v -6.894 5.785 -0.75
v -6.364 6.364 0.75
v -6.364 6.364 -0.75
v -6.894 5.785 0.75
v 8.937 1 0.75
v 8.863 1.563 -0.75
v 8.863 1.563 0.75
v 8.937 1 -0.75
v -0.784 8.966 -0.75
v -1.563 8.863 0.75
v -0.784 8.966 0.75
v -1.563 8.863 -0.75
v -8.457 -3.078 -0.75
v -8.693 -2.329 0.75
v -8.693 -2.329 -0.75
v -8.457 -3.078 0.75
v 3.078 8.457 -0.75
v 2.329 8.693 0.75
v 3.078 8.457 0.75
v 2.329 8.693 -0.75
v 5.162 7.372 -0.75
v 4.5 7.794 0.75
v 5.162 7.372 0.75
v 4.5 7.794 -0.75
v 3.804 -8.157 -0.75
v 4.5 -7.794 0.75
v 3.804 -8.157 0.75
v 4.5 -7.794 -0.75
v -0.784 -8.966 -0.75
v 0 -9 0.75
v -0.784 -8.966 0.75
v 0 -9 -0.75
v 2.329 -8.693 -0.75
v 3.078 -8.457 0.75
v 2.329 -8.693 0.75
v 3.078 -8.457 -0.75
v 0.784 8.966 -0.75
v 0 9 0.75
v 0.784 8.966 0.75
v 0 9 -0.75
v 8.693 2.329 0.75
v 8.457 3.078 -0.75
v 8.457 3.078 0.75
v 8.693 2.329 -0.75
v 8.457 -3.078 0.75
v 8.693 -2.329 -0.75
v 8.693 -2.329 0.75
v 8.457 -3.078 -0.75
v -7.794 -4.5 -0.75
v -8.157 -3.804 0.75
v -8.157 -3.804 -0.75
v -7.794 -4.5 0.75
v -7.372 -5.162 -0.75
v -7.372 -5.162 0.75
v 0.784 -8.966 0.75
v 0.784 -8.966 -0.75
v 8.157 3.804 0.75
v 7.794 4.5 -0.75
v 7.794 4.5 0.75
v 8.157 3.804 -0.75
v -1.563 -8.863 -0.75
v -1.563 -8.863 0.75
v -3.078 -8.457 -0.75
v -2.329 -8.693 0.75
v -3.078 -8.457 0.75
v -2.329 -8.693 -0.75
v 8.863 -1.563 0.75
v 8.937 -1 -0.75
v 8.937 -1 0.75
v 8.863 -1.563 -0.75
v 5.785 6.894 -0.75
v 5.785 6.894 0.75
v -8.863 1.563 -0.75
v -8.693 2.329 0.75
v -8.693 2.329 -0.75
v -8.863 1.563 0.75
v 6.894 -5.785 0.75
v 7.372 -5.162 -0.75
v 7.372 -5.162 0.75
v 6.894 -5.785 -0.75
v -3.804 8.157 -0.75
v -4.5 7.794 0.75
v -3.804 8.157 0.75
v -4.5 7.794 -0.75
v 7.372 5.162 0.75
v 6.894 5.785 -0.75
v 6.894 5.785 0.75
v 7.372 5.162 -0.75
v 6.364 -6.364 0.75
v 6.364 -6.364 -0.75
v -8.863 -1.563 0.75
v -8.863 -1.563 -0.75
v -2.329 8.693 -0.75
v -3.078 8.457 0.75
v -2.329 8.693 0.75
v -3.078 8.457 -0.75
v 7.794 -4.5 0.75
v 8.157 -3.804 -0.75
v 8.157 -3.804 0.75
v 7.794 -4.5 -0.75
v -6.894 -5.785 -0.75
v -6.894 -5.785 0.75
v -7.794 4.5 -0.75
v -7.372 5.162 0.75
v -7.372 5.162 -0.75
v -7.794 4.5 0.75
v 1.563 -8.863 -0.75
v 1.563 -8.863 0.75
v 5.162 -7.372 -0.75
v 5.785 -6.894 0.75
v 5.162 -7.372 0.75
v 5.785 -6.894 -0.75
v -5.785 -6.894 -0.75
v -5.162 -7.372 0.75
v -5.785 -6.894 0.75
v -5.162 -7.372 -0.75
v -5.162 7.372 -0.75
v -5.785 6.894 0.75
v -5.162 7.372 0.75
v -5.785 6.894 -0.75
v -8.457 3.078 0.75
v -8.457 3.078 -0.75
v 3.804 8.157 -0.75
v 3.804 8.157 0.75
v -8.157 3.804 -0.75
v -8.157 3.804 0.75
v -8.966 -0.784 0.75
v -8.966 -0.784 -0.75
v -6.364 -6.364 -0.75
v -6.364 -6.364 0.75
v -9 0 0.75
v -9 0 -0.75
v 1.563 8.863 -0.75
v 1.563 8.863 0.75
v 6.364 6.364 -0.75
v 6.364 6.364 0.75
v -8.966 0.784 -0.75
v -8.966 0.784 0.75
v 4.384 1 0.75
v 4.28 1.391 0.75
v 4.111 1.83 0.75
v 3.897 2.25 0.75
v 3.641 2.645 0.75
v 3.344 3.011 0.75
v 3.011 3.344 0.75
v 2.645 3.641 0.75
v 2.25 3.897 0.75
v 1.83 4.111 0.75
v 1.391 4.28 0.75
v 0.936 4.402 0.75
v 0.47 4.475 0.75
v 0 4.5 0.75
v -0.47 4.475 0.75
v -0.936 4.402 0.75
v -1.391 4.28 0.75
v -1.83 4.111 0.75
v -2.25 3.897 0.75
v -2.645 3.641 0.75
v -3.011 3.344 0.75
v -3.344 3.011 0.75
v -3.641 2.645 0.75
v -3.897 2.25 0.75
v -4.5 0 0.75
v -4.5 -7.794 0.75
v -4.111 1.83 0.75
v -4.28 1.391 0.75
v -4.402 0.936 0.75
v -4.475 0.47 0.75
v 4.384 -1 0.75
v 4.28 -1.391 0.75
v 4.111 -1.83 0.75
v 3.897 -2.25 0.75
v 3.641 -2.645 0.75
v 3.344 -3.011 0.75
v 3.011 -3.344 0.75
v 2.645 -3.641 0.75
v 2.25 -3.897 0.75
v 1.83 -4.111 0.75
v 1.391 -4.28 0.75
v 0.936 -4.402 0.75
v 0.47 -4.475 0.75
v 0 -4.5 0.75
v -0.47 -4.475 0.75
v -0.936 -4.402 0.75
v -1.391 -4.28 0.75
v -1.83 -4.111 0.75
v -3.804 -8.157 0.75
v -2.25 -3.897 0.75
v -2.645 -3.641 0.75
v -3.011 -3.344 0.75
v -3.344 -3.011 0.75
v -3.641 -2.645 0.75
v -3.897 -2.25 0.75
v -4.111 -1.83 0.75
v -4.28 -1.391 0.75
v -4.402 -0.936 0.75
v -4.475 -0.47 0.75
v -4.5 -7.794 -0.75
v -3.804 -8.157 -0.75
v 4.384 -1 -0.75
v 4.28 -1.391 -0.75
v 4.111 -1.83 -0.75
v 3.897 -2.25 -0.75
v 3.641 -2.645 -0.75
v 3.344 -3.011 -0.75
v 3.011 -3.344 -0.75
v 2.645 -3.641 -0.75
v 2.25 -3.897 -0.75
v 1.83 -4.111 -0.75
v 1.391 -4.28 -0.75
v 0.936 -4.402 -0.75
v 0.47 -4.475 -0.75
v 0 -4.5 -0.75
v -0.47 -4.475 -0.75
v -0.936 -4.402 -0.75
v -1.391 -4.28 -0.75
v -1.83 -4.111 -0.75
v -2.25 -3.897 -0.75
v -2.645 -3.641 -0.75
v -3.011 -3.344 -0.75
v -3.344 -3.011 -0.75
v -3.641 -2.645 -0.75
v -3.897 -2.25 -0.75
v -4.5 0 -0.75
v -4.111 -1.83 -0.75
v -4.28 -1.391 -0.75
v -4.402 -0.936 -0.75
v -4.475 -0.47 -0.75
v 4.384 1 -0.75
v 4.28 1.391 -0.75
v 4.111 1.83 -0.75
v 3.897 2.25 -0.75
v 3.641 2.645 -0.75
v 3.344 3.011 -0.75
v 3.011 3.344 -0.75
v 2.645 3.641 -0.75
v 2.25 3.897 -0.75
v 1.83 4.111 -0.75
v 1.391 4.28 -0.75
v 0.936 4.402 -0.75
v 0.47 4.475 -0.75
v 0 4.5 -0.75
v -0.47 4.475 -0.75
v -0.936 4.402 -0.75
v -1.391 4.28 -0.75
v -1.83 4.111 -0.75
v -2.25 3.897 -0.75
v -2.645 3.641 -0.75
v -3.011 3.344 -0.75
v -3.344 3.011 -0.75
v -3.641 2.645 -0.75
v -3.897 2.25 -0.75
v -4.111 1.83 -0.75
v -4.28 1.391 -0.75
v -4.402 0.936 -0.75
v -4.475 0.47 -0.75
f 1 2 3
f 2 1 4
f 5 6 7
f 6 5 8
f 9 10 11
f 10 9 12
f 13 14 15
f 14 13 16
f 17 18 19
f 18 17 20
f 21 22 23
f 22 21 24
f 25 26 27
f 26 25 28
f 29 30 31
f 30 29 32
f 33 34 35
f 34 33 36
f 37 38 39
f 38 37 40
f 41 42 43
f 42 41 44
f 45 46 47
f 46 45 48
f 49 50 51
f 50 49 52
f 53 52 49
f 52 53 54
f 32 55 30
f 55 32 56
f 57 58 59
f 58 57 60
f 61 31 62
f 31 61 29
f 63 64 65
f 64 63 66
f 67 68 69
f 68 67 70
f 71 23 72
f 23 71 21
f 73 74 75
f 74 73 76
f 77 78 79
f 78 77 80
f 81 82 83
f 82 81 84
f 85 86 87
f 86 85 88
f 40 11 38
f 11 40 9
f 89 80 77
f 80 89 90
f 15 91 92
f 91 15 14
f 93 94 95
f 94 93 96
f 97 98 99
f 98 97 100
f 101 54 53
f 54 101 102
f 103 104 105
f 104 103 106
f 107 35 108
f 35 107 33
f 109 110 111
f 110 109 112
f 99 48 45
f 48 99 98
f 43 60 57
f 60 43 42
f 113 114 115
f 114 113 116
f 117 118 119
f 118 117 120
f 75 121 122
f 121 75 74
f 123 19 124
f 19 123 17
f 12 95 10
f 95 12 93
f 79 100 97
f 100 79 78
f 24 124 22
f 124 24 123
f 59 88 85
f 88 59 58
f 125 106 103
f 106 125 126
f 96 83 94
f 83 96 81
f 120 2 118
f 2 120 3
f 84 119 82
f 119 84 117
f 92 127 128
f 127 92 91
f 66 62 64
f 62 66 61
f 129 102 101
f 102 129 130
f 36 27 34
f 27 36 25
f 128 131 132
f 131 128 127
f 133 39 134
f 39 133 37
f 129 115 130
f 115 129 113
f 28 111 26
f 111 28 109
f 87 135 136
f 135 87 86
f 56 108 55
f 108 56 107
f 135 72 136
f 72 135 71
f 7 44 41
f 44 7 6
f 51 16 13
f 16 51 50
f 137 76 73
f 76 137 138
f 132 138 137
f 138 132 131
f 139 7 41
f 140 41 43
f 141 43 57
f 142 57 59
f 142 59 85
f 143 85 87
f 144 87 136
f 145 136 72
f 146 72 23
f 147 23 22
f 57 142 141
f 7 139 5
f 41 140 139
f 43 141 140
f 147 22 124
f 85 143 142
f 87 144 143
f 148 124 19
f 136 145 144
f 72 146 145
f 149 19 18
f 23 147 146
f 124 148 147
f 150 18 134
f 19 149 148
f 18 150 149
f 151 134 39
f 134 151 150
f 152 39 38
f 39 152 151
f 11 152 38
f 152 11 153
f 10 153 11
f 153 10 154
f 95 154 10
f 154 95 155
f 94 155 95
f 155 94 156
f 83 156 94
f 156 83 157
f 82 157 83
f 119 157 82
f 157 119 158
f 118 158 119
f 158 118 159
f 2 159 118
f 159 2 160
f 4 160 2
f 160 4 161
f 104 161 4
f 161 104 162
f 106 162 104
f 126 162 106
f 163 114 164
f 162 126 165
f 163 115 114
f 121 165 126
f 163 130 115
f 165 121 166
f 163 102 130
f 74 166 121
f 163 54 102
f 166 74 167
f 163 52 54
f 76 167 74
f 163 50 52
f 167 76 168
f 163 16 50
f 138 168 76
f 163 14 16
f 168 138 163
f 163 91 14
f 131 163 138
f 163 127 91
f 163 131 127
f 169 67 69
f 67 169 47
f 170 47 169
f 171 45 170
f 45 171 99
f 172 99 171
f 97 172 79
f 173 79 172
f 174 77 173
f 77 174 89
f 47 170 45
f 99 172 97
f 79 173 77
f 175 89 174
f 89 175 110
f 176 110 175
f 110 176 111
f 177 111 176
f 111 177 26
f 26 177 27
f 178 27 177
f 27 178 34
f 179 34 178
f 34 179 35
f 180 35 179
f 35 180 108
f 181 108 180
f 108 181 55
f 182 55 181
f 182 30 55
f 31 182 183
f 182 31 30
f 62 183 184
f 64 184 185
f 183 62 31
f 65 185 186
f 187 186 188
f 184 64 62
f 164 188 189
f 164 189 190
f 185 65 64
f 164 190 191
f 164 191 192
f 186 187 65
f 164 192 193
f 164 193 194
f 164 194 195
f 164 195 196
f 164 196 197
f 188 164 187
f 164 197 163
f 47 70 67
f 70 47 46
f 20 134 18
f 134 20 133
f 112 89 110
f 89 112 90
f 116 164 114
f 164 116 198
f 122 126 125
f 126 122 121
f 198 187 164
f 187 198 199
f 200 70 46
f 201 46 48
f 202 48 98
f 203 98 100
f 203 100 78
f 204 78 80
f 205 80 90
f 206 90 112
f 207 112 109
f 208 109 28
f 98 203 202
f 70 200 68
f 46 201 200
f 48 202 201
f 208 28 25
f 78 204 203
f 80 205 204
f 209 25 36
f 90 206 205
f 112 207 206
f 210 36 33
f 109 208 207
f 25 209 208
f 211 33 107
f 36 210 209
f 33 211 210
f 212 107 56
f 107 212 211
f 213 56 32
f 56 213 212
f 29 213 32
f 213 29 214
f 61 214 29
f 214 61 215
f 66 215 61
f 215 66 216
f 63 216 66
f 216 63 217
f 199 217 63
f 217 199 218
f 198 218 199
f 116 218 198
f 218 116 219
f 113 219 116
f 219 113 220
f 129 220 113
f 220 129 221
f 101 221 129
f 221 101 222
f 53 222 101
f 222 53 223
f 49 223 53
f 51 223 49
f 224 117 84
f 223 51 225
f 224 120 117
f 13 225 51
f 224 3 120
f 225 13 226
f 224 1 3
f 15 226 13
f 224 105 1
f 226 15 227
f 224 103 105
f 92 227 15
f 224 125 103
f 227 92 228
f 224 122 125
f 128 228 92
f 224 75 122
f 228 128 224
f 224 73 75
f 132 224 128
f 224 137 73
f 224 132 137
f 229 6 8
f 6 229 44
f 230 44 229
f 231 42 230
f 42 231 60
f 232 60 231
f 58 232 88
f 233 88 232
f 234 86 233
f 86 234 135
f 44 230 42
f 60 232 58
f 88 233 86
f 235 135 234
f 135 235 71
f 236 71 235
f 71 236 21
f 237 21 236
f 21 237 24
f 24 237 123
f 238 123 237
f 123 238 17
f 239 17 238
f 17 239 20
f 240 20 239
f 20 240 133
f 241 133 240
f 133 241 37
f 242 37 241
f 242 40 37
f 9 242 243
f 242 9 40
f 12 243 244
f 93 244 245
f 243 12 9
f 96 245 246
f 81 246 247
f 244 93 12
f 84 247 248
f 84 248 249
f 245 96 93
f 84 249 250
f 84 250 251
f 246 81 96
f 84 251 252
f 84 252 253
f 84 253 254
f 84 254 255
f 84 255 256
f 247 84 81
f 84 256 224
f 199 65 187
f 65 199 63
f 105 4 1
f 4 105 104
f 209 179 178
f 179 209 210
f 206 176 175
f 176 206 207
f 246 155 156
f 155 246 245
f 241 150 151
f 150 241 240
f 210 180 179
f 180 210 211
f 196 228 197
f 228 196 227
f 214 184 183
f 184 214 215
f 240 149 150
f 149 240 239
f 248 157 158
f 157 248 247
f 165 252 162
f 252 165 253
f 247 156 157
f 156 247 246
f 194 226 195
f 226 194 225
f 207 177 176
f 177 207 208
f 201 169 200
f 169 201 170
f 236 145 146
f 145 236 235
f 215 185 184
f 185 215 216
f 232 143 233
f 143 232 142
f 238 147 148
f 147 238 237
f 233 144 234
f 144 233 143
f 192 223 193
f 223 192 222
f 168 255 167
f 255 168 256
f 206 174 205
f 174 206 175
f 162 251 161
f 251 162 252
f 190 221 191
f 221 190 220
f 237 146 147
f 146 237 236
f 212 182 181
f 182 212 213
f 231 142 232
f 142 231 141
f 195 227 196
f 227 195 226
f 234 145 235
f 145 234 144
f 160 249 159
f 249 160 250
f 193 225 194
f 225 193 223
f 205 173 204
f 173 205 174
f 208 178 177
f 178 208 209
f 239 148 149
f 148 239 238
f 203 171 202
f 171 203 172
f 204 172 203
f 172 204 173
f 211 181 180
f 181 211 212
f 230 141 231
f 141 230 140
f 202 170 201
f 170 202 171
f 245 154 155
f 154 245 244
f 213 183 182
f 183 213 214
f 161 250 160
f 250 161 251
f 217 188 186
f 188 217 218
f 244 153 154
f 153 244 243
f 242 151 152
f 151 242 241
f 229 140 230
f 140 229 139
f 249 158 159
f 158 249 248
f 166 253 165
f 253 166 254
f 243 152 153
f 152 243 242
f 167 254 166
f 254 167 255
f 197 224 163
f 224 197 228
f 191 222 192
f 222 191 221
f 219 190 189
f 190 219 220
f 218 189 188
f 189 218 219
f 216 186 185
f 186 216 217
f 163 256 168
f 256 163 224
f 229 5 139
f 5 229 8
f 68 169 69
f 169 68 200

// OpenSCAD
// Part A11: split lock ring / gear lock.
// SPDX-License-Identifier: MIT
//
// Lock ring that secures b1 on the central axle.
// Geometry is approximate – no dedicated detail drawing available.

module part_a11(od = 18.0, id = 9.0, th = 1.5, gap_w = 2.0) {
    difference() {
        cylinder(d = od, h = th, center = true, $fn = 72);
        cylinder(d = id, h = th + 0.2, center = true, $fn = 60);
        // Split gap (c-clip style).
        translate([0, -gap_w / 2, -th / 2 - 0.1]) cube([od / 2 + 1, gap_w, th + 0.2], center = false);
    }
}


// ---- "main guard" ----
if (is_undef(__LIB_MODE__)) {
    part_a11();
}
